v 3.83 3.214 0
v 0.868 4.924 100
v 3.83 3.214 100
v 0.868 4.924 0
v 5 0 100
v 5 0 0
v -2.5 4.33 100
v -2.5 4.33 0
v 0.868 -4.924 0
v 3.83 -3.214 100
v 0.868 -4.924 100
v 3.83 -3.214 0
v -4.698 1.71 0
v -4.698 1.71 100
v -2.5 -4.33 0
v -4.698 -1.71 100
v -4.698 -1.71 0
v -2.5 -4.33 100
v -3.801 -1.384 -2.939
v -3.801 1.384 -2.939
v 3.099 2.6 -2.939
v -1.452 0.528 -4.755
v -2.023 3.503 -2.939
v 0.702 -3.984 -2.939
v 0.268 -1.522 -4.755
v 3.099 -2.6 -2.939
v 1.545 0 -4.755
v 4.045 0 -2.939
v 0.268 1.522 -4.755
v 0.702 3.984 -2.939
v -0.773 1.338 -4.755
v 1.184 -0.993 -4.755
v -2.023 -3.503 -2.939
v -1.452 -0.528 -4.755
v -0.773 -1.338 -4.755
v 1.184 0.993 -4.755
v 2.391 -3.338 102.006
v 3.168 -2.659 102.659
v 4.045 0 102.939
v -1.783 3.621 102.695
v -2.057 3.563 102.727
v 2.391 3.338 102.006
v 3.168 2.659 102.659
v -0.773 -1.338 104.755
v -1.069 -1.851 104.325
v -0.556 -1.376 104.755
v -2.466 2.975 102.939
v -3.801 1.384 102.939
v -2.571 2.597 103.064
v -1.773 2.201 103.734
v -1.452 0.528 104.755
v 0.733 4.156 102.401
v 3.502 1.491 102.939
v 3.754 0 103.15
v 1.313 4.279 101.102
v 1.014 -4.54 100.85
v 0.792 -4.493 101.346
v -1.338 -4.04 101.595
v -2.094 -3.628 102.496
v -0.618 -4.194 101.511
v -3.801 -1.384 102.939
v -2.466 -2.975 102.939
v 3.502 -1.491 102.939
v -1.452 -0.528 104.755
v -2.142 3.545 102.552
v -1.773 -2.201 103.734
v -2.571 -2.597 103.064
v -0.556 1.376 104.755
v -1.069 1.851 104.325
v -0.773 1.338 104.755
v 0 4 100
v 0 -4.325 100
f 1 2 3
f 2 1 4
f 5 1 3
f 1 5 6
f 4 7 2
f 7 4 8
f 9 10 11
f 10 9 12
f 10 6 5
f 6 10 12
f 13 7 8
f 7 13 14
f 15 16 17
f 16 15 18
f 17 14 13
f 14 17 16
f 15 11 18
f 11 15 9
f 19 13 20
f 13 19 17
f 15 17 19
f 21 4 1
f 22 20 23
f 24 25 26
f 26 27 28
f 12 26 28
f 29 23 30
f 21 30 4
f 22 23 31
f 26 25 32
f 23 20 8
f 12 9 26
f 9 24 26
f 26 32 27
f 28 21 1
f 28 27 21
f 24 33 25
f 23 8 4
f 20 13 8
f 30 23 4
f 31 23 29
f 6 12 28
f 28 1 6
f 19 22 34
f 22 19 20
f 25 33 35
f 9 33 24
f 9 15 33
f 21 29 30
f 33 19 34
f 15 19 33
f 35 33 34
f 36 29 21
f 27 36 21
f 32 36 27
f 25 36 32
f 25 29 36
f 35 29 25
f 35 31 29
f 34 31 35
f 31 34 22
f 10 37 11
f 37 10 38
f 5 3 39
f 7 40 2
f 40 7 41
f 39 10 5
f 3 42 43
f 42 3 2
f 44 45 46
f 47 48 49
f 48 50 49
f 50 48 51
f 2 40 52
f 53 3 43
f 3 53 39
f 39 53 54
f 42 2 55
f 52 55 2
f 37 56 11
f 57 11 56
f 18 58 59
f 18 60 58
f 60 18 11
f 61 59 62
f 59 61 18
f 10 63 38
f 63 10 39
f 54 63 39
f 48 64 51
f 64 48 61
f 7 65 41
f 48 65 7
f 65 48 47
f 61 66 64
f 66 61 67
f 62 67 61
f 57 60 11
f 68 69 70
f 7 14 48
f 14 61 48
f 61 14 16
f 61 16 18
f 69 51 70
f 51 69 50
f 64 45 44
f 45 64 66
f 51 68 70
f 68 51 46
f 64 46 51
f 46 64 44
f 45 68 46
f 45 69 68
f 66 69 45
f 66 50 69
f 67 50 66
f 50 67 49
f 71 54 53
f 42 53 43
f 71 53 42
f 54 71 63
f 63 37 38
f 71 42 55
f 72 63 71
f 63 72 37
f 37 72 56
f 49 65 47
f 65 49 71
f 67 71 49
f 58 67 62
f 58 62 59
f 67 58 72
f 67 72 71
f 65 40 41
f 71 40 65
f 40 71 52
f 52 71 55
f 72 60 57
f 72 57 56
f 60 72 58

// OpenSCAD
w=19.2;

a=1.5;
b=0.75;

c=0.87; //2lines

d=4;




//translate([12.5,-w/2,115.71])
//rotate([0,50,0])
//{
//    sensor3_holder();
//}

module sensor3_holder()
{
    cube([d,w,c]);
    cube([d,b,a]);
    translate([0,w,0])
    cube([d,b,a]);
}

module head() 
{
	difference() 
	{
		union()
		 {
			//cylinder(r=5,h=100,$fn=30);
			//translate([0,0,0])sphere(r=5,$fn=30);

			//translate([0,0,100])sphere(r=5,$fn=30);
             
			difference() 
			{
				translate([0,-7,100]) rotate([0,-40,0]) cube([20,14,4]);
				translate([0,4,98]) rotate([0,-40,12]) cube([20,14,8]);
				translate([-3,-18,98]) rotate([0,-40,-12]) cube([20,14,8]);
			}
		}
	
		translate([-14.5,-5,-5]) cube([10,10,120]);
        
        
	}
}

module grip() 
{
	
		union()
		 {
			cylinder(r=5,h=100,$fn=9);
			translate([0,0,0])sphere(r=5,$fn=9);

			translate([0,0,100])sphere(r=5,$fn=9);
             
			//difference() 
			//{
			//	translate([0,-7,100]) rotate([0,-40,0]) cube([20,14,4]);
			//	translate([0,4,98]) rotate([0,-40,12]) cube([20,14,8]);
			//	translate([-3,-18,98]) rotate([0,-40,-12]) cube([20,14,8]);
			//}
		}
	
		//translate([-14.5,-5,-5]) cube([10,10,120]);
  
}

difference()
{
grip();
    head();
}
